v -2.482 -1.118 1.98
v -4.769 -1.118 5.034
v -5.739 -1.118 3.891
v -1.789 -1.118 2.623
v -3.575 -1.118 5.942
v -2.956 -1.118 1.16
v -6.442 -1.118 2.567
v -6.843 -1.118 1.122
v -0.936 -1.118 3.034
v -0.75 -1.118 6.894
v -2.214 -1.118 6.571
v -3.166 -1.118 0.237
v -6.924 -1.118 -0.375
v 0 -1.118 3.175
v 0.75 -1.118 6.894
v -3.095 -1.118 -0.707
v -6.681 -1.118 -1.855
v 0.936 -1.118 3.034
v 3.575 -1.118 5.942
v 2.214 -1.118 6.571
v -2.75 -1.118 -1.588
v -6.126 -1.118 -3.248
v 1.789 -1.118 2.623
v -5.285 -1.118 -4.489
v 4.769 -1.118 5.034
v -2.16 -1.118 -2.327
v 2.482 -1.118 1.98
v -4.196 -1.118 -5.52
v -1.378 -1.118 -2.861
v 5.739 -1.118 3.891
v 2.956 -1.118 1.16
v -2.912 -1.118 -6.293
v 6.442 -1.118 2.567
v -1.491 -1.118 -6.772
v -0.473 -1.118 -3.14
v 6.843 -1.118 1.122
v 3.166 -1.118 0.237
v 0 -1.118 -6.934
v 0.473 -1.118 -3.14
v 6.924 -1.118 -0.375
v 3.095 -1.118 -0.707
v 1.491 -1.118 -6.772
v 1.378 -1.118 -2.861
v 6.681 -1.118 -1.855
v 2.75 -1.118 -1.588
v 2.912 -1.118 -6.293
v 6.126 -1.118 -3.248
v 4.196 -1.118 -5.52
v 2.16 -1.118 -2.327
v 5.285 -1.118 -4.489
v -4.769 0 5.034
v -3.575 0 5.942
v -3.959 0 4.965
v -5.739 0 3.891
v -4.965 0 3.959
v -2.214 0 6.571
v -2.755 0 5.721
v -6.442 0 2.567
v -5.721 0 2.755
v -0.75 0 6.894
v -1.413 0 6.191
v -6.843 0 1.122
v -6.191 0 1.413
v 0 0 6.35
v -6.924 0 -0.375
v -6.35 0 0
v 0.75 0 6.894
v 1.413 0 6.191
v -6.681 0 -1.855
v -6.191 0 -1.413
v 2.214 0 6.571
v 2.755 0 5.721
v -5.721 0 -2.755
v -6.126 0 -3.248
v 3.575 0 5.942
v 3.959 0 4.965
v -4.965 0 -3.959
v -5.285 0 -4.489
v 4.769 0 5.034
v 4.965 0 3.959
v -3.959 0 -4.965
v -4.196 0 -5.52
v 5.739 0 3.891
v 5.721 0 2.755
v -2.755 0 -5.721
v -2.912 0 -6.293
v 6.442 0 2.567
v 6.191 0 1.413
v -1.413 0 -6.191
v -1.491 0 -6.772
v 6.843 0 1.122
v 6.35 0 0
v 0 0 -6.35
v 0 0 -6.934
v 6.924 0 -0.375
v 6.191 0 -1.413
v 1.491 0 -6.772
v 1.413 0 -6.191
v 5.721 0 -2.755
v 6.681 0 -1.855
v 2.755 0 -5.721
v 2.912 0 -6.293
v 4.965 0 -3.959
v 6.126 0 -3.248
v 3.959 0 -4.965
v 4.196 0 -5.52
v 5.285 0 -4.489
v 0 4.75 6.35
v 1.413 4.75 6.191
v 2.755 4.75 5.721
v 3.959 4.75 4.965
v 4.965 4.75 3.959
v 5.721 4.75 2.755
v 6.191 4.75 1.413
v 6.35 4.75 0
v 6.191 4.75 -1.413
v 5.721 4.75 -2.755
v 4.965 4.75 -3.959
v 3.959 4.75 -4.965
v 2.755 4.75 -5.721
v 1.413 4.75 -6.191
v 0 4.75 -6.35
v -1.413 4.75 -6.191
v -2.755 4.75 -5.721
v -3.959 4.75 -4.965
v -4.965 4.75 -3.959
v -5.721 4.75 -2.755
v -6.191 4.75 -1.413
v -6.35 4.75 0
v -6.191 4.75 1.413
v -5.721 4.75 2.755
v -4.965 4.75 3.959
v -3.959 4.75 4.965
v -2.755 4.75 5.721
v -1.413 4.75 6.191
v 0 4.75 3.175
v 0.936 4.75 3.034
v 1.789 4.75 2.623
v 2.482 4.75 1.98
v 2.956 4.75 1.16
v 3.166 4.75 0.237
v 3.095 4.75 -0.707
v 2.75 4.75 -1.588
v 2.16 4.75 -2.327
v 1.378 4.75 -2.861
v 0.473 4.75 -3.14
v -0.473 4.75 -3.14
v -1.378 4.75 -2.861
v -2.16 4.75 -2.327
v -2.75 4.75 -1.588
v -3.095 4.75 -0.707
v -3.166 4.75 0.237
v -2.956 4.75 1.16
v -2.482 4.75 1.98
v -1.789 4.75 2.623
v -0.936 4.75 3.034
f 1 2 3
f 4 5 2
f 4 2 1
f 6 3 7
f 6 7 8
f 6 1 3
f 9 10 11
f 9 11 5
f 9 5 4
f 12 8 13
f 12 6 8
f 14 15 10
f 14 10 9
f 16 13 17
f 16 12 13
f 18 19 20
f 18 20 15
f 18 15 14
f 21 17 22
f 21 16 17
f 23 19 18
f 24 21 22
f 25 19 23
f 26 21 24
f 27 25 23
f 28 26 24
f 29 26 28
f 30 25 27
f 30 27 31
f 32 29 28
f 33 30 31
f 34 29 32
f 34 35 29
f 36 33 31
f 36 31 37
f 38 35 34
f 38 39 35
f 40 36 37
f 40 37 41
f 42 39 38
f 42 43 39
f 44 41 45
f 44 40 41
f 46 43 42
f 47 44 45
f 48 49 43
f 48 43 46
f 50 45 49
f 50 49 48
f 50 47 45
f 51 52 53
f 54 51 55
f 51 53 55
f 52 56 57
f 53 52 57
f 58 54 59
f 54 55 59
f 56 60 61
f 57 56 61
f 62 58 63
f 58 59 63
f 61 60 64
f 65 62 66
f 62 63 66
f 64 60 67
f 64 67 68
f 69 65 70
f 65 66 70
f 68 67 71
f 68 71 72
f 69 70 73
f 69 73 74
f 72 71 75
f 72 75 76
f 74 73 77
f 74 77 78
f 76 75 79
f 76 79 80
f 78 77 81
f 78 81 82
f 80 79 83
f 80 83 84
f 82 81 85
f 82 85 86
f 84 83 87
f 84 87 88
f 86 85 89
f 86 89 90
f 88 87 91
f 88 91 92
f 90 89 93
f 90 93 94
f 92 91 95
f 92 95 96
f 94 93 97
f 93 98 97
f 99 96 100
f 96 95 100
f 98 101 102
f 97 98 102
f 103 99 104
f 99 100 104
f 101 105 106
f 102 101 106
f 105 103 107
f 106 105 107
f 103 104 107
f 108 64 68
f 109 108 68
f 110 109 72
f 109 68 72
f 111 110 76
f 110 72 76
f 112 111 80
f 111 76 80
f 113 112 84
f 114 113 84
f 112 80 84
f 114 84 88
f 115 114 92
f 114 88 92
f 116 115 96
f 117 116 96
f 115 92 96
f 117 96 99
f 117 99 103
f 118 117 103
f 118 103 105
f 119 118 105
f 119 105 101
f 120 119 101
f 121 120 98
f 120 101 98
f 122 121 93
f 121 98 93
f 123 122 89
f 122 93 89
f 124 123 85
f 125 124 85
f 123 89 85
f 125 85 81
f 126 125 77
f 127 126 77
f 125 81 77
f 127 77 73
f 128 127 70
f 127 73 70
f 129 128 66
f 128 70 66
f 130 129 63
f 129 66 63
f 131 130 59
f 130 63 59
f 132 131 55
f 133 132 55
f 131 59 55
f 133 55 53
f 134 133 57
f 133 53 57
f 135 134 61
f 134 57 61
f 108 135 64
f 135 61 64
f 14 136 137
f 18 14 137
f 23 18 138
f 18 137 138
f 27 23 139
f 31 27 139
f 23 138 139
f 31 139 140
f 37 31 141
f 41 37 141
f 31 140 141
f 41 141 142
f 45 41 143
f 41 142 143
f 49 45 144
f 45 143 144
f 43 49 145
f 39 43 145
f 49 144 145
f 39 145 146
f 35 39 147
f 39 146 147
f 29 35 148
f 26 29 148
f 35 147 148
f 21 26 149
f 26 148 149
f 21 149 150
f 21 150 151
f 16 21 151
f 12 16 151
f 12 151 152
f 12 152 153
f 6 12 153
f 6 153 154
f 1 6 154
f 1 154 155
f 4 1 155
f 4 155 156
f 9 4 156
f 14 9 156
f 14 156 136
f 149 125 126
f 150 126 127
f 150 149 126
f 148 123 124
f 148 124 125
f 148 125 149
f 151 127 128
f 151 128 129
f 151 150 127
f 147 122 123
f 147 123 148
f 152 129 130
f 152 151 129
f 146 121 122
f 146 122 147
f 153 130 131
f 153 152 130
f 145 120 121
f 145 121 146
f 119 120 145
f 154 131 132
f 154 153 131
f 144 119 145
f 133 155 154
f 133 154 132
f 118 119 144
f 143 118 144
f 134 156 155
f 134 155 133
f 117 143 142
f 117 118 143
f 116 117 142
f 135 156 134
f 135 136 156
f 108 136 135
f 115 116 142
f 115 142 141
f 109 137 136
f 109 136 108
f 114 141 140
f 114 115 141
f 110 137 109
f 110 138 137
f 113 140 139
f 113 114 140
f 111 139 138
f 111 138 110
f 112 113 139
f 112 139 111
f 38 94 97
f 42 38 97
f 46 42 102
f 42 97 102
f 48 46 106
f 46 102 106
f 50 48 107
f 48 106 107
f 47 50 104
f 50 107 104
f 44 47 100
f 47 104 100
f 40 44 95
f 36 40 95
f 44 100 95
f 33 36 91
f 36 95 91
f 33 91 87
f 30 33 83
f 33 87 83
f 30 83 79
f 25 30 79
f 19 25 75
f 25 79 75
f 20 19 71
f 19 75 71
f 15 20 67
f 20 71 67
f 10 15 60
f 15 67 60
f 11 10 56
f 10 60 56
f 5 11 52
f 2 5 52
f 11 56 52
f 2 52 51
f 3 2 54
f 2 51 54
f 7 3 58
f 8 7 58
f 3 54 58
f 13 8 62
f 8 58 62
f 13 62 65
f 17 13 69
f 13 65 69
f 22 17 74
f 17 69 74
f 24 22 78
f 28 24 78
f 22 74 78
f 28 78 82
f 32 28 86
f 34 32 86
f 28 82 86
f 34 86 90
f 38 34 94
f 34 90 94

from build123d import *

# Parameters (mm, degrees)
SKETCH1_R           = 6.35
BOSS_EXTRUDE1_DEPTH = 4.7498
SKETCH2_R           = 6.9342
BOSS_EXTRUDE2_DEPTH = 1.1176
CUT_EXTRUDE1_REACH  = 13.428
SKETCH3_R           = 3.175


with BuildPart() as part:
    # Sketch1 → Boss-Extrude1 (new body)
    with BuildSketch(Plane(origin=(0, 0, 0), x_dir=(1, 0, 0), z_dir=(0, 1, 0))):
        with Locations(Location((0, 0, 0), (0, 0, 270))):
            Circle(SKETCH1_R)
    extrude(amount=BOSS_EXTRUDE1_DEPTH)

    # Sketch2 → Boss-Extrude2 (add)
    with BuildSketch(Plane.XZ):
        with Locations(Location((0, 0, 0), (0, 0, 270))):
            Circle(SKETCH2_R)
    extrude(amount=BOSS_EXTRUDE2_DEPTH)

    # Sketch3 → Cut-Extrude1 (cut, up to next)
    with BuildSketch(Plane(origin=(0, 4.7498, 0), x_dir=(1, 0, 0), z_dir=(0, 1, 0)), mode=Mode.PRIVATE) as cut_extrude1_sk1:
        with Locations(Location((0, 0, 0), (0, 0, 270))):
            Circle(SKETCH3_R)
    cut_extrude1_tool1 = extrude(cut_extrude1_sk1.sketch, amount=-CUT_EXTRUDE1_REACH, mode=Mode.PRIVATE) & part.part
    add(cut_extrude1_tool1.solids().sort_by_distance((0, 4.7498, 0))[0], mode=Mode.SUBTRACT)


solid = part.part
